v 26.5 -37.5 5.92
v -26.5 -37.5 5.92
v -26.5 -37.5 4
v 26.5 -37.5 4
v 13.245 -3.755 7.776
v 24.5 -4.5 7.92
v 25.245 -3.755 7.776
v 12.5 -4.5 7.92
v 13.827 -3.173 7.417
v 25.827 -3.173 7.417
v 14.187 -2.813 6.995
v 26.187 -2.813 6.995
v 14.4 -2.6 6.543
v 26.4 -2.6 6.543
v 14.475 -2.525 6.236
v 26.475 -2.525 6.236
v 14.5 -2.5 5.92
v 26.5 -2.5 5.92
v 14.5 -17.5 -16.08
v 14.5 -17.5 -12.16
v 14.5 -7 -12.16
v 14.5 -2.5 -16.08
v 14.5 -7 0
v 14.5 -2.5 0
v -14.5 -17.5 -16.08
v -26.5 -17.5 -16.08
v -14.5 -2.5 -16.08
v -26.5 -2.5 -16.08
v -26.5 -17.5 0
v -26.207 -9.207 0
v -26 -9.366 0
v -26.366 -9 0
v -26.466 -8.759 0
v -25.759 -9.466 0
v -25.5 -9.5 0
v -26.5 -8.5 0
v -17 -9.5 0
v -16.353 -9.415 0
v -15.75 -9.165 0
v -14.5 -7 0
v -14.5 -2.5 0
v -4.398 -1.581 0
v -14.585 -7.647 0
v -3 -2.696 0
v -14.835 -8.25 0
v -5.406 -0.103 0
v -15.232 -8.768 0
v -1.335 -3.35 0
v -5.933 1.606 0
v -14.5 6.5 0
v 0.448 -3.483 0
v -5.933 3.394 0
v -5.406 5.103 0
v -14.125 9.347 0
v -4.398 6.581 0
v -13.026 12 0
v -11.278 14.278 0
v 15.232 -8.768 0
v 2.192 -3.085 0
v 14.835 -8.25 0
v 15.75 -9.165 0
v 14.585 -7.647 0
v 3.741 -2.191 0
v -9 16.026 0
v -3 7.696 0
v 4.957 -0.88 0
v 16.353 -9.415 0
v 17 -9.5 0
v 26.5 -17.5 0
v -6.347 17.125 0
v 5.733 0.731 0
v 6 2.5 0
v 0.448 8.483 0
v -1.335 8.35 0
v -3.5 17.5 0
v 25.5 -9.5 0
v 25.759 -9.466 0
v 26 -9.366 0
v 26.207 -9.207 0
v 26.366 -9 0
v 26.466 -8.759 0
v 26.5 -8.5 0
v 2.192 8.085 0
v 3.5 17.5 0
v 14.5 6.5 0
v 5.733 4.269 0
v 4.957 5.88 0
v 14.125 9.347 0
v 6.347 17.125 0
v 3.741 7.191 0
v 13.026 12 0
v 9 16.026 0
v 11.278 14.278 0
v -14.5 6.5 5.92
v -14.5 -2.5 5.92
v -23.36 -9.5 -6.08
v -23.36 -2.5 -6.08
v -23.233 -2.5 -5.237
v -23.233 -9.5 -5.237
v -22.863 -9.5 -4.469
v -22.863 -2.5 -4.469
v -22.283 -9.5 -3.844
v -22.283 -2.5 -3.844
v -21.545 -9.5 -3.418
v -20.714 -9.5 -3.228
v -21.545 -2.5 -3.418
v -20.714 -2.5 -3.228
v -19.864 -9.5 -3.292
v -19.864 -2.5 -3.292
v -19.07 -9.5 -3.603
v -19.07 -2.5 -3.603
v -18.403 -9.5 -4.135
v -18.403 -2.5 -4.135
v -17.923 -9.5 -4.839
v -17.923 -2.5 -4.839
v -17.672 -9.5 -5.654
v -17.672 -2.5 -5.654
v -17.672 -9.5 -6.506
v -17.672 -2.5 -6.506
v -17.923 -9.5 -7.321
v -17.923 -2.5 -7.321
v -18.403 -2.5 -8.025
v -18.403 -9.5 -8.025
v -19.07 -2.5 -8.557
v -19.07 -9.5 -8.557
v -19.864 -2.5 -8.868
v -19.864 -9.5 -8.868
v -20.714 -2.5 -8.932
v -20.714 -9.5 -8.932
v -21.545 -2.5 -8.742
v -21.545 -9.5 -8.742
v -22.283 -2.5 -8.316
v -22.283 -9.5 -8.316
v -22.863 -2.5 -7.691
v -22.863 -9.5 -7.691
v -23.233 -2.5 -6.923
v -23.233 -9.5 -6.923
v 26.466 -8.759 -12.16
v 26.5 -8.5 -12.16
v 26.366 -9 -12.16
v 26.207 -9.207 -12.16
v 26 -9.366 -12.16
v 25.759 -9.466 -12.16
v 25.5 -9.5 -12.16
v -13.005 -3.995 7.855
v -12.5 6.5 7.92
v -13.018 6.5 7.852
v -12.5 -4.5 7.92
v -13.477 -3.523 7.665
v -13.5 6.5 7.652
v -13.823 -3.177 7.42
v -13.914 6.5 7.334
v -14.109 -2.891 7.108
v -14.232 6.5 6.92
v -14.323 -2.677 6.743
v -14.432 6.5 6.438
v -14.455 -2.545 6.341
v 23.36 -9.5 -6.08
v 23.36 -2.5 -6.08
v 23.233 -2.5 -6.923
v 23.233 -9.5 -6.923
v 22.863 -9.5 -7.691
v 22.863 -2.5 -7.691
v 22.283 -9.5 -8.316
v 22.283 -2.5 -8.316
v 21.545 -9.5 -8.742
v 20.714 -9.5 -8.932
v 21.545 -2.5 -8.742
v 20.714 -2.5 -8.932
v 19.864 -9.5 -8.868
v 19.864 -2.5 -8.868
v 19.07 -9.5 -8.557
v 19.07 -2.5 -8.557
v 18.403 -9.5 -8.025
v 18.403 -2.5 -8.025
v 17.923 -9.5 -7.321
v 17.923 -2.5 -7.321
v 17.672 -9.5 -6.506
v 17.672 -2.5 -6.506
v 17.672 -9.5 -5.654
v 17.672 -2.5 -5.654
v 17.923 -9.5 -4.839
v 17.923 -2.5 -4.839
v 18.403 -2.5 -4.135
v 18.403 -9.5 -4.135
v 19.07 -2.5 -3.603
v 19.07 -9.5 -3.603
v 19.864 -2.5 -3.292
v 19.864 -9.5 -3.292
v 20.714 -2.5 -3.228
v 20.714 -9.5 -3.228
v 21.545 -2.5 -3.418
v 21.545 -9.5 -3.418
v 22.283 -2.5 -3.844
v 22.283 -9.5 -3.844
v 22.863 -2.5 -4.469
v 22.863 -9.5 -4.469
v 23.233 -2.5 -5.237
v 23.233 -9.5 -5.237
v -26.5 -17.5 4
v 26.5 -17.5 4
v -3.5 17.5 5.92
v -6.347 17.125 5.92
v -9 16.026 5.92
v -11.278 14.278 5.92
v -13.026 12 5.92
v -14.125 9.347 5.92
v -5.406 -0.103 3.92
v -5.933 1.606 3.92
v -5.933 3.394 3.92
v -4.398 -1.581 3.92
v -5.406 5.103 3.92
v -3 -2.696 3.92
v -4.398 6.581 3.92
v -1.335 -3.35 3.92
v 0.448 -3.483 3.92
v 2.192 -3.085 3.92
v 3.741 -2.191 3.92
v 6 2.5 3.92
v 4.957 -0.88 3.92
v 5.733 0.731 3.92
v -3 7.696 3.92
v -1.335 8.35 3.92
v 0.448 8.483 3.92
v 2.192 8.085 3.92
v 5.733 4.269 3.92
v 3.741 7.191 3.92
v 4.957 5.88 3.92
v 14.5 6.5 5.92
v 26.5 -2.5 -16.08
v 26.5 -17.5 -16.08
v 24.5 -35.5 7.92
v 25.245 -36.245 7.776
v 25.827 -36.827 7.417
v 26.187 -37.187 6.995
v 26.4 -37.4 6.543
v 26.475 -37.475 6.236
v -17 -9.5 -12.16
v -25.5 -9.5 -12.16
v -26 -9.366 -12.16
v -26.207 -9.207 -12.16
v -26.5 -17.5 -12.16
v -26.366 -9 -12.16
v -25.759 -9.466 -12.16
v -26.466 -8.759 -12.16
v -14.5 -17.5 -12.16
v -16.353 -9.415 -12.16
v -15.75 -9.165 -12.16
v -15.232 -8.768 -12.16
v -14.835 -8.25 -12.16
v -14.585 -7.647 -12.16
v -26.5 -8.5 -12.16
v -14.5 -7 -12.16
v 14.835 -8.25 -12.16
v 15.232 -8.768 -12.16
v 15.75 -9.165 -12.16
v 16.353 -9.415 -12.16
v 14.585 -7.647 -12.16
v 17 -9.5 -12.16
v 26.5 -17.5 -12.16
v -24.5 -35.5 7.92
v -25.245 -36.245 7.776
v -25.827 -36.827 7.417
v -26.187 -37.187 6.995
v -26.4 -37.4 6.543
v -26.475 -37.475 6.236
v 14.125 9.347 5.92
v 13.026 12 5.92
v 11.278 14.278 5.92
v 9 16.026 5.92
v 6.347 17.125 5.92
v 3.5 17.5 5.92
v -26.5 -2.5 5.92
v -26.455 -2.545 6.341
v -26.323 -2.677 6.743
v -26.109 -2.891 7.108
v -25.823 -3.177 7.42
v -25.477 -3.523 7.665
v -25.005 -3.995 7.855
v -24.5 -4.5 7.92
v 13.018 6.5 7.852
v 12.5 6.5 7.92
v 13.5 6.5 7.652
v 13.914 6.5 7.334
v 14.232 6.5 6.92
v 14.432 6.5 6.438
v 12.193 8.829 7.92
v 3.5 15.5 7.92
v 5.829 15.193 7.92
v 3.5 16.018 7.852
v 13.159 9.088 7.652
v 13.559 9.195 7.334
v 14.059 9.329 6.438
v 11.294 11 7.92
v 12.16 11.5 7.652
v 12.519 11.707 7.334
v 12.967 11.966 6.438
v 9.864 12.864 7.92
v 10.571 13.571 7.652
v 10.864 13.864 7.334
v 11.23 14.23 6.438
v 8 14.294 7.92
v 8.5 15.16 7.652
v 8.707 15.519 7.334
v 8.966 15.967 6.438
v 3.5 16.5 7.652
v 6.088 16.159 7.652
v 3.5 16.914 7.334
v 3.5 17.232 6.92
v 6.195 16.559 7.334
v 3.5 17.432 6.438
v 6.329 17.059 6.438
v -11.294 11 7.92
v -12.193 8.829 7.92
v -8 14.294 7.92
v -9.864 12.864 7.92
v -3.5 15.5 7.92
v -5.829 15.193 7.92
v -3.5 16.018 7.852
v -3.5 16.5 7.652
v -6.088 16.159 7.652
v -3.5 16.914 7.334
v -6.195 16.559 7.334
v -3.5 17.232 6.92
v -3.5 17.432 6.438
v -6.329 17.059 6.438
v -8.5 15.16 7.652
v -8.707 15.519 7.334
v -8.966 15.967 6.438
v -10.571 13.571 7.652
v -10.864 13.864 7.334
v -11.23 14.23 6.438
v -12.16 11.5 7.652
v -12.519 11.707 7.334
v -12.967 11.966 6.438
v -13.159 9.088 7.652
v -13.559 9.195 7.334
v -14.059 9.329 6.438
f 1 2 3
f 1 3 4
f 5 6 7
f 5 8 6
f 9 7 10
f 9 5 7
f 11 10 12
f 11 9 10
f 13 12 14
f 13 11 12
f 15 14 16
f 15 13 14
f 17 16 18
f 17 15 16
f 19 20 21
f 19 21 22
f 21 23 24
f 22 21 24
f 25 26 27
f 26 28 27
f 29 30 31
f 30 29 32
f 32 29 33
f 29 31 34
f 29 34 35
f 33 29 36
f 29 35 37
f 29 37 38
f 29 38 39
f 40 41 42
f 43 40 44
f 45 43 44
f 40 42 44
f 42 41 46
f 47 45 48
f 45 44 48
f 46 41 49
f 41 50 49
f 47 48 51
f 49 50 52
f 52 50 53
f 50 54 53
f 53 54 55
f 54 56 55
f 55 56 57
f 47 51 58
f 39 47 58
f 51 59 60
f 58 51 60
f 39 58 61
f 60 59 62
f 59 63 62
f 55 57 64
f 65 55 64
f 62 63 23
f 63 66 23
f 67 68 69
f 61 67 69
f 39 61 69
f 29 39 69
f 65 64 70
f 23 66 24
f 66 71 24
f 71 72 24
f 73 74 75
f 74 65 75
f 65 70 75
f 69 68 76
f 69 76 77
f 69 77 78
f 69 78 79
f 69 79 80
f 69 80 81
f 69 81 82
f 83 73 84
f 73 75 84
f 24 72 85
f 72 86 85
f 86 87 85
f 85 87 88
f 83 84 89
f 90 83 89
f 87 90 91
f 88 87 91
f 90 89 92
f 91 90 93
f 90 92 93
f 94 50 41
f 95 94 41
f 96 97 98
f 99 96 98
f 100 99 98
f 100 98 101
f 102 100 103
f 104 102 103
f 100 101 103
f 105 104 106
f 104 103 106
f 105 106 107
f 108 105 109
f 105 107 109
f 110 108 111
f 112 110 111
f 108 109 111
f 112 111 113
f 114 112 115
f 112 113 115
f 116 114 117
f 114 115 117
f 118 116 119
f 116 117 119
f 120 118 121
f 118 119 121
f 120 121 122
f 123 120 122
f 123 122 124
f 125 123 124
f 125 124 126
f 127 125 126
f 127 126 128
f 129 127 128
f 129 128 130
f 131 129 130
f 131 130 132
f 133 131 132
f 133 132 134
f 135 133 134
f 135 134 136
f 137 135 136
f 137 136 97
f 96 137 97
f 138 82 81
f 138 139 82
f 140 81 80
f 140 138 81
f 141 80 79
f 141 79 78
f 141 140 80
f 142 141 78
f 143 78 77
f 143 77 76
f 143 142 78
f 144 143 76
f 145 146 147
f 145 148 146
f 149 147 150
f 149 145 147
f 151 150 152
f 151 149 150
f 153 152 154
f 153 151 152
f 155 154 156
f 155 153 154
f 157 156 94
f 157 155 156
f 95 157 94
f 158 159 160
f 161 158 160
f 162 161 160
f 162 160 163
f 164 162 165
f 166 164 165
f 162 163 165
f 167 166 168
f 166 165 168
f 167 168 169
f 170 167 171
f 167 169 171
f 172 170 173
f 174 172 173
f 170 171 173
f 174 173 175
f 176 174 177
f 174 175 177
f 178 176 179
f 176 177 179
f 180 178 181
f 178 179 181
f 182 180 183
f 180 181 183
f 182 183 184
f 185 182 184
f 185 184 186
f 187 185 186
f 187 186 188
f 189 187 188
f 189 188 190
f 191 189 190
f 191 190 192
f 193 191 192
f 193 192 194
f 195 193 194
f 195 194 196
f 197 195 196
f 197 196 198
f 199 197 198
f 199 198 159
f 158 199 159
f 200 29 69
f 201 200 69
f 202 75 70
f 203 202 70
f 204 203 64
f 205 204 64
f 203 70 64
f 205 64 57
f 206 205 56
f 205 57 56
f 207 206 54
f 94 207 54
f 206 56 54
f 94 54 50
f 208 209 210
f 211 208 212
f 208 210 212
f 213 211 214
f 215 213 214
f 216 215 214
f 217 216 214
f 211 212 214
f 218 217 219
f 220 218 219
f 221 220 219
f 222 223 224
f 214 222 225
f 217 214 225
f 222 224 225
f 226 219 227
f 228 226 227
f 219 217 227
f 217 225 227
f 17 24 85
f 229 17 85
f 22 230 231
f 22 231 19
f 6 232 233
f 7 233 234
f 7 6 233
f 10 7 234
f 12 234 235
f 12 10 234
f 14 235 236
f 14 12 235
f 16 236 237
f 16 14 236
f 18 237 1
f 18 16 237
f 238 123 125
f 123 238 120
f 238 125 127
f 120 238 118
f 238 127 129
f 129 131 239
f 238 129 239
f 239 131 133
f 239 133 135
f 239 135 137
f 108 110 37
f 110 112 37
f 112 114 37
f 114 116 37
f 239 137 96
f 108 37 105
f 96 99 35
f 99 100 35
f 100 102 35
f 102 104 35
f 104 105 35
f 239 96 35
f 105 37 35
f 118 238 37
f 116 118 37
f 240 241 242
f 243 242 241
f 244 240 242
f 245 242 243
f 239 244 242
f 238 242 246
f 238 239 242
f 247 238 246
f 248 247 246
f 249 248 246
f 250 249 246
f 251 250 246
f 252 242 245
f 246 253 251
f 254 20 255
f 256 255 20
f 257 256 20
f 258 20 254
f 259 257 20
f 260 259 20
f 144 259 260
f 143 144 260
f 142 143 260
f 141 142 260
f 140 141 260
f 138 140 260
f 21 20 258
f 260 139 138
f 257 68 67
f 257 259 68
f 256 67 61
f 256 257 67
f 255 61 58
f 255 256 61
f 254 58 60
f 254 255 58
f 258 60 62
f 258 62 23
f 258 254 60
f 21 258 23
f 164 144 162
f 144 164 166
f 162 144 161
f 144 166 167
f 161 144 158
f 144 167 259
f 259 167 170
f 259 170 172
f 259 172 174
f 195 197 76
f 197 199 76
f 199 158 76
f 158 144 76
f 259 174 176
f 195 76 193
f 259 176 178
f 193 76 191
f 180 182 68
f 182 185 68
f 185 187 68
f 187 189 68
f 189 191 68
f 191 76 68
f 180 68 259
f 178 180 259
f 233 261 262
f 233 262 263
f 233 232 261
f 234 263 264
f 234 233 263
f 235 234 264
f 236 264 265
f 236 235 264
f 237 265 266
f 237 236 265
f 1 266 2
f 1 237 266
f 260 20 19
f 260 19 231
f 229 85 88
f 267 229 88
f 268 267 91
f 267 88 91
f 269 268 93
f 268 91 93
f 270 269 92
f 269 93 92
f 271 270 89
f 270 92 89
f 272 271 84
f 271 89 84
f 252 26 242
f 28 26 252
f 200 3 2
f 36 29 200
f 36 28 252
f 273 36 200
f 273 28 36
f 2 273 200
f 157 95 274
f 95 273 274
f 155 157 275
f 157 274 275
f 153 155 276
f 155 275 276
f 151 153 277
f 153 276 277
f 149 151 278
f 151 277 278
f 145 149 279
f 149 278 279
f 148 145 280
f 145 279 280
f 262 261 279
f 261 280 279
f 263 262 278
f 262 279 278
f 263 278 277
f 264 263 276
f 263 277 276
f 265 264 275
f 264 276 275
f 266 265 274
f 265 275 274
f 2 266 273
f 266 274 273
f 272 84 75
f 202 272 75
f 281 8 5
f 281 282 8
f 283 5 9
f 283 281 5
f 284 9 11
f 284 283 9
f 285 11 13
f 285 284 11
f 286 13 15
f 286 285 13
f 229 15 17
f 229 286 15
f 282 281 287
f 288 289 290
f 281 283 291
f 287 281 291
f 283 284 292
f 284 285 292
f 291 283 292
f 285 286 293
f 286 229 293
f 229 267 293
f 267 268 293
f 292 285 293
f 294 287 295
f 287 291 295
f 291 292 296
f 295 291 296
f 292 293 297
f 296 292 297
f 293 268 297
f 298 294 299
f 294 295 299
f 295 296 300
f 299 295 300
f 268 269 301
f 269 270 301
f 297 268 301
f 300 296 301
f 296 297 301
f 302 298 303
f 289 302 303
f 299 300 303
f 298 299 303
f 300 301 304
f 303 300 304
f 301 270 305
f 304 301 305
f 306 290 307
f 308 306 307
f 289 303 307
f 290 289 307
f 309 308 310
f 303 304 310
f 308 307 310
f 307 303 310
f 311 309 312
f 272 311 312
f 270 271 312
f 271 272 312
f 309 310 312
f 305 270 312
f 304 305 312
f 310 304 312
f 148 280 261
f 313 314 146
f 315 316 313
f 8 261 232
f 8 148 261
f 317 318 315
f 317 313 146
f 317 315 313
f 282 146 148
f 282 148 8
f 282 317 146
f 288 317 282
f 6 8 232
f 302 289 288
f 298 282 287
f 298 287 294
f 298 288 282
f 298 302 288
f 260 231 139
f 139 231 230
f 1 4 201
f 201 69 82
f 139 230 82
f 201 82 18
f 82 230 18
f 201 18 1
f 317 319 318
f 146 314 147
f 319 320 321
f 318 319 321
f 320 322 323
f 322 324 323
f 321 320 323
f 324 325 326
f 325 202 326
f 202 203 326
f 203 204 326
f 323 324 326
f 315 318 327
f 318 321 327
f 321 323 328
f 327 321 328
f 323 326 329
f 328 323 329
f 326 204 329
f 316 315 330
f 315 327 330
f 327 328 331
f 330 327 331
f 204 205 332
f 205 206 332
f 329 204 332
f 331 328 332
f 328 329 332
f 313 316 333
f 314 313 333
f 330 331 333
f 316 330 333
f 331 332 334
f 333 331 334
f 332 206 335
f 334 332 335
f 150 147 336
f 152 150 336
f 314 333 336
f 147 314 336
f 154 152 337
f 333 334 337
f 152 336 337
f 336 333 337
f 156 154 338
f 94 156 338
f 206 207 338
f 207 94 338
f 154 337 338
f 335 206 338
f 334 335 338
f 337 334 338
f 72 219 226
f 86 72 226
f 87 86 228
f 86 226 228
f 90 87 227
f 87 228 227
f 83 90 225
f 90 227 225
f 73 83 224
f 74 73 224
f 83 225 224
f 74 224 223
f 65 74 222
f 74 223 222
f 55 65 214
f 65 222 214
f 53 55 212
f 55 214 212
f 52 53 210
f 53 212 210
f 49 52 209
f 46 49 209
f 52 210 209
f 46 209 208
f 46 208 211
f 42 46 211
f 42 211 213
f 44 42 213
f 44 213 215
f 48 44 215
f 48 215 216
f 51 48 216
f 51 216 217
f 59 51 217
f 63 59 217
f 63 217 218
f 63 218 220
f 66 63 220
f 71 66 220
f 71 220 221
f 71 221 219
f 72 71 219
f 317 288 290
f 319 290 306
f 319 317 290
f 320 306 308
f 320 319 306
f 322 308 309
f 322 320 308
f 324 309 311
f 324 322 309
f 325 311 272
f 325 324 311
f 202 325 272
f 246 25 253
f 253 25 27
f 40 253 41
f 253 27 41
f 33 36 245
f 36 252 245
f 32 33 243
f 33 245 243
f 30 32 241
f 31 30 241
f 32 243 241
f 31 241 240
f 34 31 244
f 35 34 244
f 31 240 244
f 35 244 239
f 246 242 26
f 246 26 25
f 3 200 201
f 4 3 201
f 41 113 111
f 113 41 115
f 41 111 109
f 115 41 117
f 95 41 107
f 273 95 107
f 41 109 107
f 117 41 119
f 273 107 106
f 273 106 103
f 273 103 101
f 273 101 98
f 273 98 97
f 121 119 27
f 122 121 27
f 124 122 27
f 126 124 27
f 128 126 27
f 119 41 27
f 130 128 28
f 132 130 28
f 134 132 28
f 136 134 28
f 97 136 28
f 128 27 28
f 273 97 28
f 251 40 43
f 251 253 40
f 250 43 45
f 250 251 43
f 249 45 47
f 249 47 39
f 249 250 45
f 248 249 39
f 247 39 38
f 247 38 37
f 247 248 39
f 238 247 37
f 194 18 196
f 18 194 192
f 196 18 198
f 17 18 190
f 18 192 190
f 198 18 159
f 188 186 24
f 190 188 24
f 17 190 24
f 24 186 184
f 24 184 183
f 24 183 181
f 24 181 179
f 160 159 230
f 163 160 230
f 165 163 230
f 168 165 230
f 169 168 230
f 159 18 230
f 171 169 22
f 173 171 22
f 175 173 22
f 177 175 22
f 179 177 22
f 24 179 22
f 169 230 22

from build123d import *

# Parameters (mm, degrees)
SKETCH_1_W           = 53
SKETCH_1_H           = 35
EXTRUDE_1_DEPTH      = 3.92
SKETCH_2_W           = 12
SKETCH_2_H           = 27
CUT_EXTRUDE_1_DEPTH  = 4
EXTRUDE_2_DEPTH      = 16.08
EXTRUDE_2_DEPTH_BACK = 3.92
SKETCH_3_W           = 12
SKETCH_3_H           = 7
SKETCH_4_W           = 12
SKETCH_4_H           = 3.92
EXTRUDE_3_DEPTH      = 8
SKETCH_5_R           = 2.86
CUT_EXTRUDE_2_DEPTH  = 37.889245045
SKETCH_6_R           = 6
CUT_EXTRUDE_3_DEPTH  = 4
EXTRUDE_4_DEPTH      = 4
SKETCH_8_W           = 53
SKETCH_8_H           = 3.92
EXTRUDE_5_DEPTH      = 20
FILLET_1_R           = 2.5
FILLET_2_R           = 11
FILLET_3_R           = 1
FILLET_4_R           = 2


with BuildPart() as part:
    # 스케치1 → 보스-돌출1 (new body)
    with BuildSketch(Plane.XY):
        Rectangle(SKETCH_1_W, SKETCH_1_H)
    extrude(amount=EXTRUDE_1_DEPTH)

    # 스케치2 → 컷-돌출1 (cut)
    with BuildSketch(Plane.XY.offset(3.92)):
        with Locations((-20.5, 4)):
            Rectangle(SKETCH_2_W, SKETCH_2_H)
        with Locations((20.5, 4)):
            Rectangle(SKETCH_2_W, SKETCH_2_H)
    extrude(amount=-CUT_EXTRUDE_1_DEPTH, mode=Mode.SUBTRACT)

    # 스케치3 → 보스-돌출2 (add, two sides: drawn at the far end of the back side and taken through both)
    with BuildSketch(Plane(origin=(0, 0, 0), x_dir=(-1, 0, 0), z_dir=(0, 0, -1)).offset(-EXTRUDE_2_DEPTH_BACK)):
        with Locations((-20.5, -6)):
            Rectangle(SKETCH_3_W, SKETCH_3_H)
        with Locations((20.5, -6)):
            Rectangle(SKETCH_3_W, SKETCH_3_H)
    extrude(amount=EXTRUDE_2_DEPTH + EXTRUDE_2_DEPTH_BACK)

    # 스케치4 → 보스-돌출3 (add)
    with BuildSketch(Plane.XZ.offset(9.5)):
        with Locations((-20.5, -14.12)):
            Rectangle(SKETCH_4_W, SKETCH_4_H)
        with Locations((20.5, -14.12)):
            Rectangle(SKETCH_4_W, SKETCH_4_H)
    extrude(amount=EXTRUDE_3_DEPTH)

    # 스케치5 → 컷-돌출2 (cut, through all)
    with BuildSketch(Plane(origin=(0, -2.5, 0), x_dir=(1, 0, 0), z_dir=(0, 1, 0))):
        with Locations(Location((-20.5, 6.08, 0), (0, 0, 180))):
            Circle(SKETCH_5_R)
        with Locations((20.5, 6.08)):
            Circle(SKETCH_5_R)
    extrude(amount=-CUT_EXTRUDE_2_DEPTH, mode=Mode.SUBTRACT)

    # 스케치6 → 컷-돌출3 (cut)
    with BuildSketch(Plane.XY.offset(3.92)):
        with Locations((0, 2.5)):
            Circle(SKETCH_6_R)
    extrude(amount=-CUT_EXTRUDE_3_DEPTH, mode=Mode.SUBTRACT)

    # 스케치7 → 보스-돌출4 (add)
    with BuildSketch(Plane.XY.offset(3.92)):
        Polygon((-14.5, -2.5), (-26.5, -2.5), (-26.5, -17.5), (26.5, -17.5), (26.5, -2.5), (14.5, -2.5), (14.5, 17.5), (-14.5, 17.5), align=None)
    extrude(amount=EXTRUDE_4_DEPTH)

    # 스케치8 → 보스-돌출5 (add)
    with BuildSketch(Plane.XZ.offset(17.5)):
        with Locations((0, 5.96)):
            Rectangle(SKETCH_8_W, SKETCH_8_H)
    extrude(amount=EXTRUDE_5_DEPTH)

    # 필렛1
    fillet_1_edges = [part.edges().sort_by_distance(p)[0] for p in [
        (14.5, -9.5, -6.08),
        (-14.5, -9.5, -6.08),
    ]]
    fillet(fillet_1_edges, radius=FILLET_1_R)

    # 필렛2
    fillet_2_edges = [part.edges().sort_by_distance(p)[0] for p in [
        (-14.5, 17.5, 3.96),
        (14.5, 17.5, 3.96),
    ]]
    fillet(fillet_2_edges, radius=FILLET_2_R)

    # 필렛3
    fillet_3_edges = [part.edges().sort_by_distance(p)[0] for p in [
        (26.5, -9.5, -6.08),
        (-26.5, -9.5, -6.08),
    ]]
    fillet(fillet_3_edges, radius=FILLET_3_R)

    # 필렛4
    fillet_4_edges = [part.edges().sort_by_distance(p)[0] for p in [
        (-20.5, -2.5, 7.92),
        (-26.5, -20, 7.92),
        (26.5, -20, 7.92),
        (20.5, -2.5, 7.92),
        (14.5, 2, 7.92),
        (0, -37.5, 7.92),
        (-14.5, 2, 7.92),
        (0, 17.5, 7.92),
        (-11.278174593, 14.278174593, 7.92),
        (11.278174593, 14.278174593, 7.92),
    ]]
    fillet(fillet_4_edges, radius=FILLET_4_R)


solid = part.part
